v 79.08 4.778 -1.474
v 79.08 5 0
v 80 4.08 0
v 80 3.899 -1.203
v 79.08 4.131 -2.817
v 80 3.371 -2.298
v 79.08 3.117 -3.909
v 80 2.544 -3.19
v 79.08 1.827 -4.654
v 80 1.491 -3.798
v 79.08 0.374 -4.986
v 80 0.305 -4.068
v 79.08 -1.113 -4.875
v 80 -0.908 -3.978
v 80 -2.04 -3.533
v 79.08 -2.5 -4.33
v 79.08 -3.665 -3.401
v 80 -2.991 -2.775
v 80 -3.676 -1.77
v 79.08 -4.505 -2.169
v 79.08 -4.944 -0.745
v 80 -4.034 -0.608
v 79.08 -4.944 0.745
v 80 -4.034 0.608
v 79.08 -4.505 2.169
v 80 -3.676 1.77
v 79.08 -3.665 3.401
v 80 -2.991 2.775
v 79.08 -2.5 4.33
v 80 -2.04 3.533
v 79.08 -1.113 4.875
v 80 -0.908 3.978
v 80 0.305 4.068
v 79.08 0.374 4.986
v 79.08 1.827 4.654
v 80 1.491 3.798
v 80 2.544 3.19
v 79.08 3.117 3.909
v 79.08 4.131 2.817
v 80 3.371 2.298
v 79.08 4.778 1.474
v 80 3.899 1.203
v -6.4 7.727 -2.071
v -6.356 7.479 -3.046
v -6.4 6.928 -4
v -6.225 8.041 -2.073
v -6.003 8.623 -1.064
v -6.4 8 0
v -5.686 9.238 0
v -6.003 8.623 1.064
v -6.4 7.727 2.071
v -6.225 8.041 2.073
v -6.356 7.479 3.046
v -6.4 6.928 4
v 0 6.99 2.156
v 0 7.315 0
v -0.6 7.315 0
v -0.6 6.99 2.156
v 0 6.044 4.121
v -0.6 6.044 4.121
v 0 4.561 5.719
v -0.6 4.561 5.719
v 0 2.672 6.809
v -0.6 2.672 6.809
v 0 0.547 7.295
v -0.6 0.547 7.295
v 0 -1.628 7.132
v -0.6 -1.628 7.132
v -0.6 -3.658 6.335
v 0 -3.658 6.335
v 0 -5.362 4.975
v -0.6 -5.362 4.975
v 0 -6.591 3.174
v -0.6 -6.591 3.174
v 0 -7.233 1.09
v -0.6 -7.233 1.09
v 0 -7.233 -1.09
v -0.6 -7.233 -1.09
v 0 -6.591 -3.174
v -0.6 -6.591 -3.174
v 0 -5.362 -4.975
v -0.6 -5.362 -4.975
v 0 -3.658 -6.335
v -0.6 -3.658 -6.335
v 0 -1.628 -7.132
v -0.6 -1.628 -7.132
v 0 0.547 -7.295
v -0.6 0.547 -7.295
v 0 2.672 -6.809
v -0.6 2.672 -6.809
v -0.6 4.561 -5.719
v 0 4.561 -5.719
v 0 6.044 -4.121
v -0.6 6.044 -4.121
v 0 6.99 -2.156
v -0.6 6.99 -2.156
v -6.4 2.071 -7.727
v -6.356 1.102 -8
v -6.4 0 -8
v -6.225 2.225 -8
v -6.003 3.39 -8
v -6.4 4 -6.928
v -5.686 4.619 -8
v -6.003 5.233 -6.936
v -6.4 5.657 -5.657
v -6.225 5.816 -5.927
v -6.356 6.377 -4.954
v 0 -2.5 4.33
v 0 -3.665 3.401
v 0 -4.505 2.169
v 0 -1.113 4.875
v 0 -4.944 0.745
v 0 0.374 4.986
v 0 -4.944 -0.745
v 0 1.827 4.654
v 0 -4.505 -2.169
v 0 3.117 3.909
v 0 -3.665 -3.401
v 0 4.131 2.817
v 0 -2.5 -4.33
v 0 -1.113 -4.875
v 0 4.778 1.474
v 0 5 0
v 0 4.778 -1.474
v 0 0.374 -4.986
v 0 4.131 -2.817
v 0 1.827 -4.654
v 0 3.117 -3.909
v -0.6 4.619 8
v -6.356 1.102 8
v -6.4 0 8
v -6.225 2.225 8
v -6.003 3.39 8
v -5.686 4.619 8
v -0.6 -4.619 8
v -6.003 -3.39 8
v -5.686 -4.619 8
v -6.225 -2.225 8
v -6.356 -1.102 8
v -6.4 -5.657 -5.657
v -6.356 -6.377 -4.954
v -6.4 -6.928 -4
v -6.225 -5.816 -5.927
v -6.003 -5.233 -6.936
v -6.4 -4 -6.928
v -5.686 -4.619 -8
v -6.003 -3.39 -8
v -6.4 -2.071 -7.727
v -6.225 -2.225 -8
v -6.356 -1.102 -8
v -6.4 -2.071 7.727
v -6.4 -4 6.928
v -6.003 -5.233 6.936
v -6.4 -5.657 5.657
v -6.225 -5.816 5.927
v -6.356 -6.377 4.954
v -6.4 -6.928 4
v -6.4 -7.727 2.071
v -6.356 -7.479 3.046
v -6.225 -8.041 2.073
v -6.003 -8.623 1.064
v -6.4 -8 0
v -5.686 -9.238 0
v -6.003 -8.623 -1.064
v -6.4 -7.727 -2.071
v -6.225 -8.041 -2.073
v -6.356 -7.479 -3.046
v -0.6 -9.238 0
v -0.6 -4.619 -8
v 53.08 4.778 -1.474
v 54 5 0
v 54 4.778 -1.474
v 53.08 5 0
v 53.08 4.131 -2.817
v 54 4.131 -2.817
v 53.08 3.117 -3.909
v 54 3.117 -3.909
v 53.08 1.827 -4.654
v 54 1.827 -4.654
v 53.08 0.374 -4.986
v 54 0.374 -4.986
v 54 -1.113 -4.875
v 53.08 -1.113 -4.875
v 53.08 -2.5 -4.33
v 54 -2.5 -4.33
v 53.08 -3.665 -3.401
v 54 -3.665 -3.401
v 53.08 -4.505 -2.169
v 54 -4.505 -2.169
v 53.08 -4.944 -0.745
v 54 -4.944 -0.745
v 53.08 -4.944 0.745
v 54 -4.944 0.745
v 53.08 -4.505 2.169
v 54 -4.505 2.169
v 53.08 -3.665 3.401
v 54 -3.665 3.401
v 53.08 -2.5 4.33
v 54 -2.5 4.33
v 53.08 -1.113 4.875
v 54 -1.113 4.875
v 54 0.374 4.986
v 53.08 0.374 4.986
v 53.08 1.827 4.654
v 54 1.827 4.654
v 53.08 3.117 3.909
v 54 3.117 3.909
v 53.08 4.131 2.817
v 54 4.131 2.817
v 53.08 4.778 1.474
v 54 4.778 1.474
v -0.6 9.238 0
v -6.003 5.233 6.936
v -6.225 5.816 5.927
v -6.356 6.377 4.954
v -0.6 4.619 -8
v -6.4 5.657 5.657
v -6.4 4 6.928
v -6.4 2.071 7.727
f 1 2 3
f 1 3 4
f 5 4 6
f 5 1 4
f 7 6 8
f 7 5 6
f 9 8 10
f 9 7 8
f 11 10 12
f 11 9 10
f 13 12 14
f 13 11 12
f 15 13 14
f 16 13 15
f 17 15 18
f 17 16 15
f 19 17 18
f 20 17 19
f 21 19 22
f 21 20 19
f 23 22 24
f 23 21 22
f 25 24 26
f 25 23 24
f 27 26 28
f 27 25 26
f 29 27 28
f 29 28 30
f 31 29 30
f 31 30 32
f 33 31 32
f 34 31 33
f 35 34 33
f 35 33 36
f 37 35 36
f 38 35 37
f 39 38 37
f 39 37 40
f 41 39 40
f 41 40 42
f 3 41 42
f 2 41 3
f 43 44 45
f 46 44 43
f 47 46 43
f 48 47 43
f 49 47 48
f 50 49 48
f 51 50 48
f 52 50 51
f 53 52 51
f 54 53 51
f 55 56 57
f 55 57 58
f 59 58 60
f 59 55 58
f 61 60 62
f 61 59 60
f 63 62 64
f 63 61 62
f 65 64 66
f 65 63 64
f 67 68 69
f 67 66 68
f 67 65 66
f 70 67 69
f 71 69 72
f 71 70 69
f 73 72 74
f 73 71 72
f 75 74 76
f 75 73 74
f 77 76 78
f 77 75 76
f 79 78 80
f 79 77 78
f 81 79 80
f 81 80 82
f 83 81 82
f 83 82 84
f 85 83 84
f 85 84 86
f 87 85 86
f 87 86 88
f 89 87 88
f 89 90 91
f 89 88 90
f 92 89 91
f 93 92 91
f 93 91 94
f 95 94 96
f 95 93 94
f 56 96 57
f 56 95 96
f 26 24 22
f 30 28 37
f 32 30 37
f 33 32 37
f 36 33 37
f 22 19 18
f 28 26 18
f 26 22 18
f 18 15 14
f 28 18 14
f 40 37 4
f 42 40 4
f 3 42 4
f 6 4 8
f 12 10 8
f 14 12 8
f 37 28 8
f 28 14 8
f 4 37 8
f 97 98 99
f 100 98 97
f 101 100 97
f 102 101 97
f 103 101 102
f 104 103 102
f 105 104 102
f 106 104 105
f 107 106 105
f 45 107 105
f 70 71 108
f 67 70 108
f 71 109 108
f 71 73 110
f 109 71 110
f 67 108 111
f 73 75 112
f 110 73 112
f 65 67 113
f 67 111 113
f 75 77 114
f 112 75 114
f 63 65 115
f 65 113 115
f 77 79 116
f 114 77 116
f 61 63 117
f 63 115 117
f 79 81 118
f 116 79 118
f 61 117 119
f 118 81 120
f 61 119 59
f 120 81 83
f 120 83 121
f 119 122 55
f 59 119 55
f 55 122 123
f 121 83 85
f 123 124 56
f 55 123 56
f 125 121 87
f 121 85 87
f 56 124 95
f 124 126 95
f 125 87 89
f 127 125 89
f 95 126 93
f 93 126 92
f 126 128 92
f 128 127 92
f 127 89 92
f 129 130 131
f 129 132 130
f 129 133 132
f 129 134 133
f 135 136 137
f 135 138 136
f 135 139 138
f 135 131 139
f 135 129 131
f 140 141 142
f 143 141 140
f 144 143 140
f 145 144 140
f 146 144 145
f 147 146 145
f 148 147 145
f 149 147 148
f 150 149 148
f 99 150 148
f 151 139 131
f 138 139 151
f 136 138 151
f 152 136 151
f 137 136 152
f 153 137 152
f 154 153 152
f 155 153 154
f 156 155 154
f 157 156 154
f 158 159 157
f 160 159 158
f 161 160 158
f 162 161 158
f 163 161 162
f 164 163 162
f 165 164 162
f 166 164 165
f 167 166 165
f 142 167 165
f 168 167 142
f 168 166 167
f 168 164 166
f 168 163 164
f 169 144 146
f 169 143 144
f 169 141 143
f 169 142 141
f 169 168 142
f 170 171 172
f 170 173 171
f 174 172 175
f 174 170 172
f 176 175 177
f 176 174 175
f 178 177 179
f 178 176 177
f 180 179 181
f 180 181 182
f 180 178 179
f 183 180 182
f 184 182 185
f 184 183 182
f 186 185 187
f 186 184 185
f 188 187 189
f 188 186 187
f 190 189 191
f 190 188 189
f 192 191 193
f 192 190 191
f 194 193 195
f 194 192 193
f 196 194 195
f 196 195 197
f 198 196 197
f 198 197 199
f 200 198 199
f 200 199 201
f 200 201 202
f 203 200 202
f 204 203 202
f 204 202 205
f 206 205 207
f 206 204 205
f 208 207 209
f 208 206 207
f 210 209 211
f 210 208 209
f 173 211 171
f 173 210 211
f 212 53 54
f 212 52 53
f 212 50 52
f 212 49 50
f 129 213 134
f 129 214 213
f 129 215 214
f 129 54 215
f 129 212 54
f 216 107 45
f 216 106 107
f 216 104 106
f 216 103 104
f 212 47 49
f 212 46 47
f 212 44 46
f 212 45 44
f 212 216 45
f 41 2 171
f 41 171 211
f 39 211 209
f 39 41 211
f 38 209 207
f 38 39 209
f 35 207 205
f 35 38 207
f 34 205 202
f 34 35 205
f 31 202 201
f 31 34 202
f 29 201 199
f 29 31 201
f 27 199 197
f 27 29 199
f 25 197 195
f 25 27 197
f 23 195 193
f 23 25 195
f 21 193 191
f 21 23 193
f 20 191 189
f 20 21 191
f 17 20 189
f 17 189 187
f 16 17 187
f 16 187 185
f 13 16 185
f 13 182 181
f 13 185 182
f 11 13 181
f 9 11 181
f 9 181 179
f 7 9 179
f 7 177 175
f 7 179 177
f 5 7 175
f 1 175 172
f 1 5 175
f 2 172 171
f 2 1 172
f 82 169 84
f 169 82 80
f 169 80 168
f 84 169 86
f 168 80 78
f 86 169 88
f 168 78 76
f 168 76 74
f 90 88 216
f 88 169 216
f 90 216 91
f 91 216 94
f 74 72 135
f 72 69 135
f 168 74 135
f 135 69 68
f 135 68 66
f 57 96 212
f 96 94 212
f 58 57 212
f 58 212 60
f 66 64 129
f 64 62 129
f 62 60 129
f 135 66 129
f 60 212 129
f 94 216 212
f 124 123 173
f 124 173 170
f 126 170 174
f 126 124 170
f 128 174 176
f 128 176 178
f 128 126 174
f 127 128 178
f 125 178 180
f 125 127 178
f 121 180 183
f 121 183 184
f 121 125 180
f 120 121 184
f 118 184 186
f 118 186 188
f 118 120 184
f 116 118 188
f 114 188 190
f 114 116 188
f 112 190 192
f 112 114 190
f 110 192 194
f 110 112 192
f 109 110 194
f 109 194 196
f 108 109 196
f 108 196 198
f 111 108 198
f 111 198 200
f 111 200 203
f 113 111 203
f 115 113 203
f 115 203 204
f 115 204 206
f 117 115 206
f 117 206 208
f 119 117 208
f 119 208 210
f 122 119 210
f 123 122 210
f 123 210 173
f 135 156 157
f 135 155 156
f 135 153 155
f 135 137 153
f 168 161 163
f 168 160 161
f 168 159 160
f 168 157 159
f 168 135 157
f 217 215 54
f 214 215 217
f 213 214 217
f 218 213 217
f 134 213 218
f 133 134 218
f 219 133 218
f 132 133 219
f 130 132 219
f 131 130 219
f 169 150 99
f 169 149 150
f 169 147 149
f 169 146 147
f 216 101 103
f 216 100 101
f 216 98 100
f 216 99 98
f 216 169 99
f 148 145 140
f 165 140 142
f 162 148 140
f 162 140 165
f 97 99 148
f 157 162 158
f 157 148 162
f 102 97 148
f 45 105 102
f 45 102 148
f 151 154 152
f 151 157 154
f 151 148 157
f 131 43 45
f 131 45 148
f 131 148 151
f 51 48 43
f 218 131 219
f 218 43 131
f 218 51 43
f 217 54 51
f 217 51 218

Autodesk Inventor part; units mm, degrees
ref_plane "YZ Plane" through (0, 0, 0) normal (1, 0, 0) x (0, 1, 0)
ref_plane "XZ Plane" through (0, 0, 0) normal (0, 1, 0) x (-1, 0, 0)
sketch "Sketch1" plane through (0, 0, 0) normal (0, 0, 1) x (1, 0, 0)
  line L0 (0, 7.315) -> (0, 5)
  line L1 (54, 5) -> (80, 5)
  line L2 (80, 5) -> (80, 0)
  line L3 (80, 0) -> (-0.6001, 0)
  line L4 (-16.7201, 0) -> (96.12, 0) projected
  line L5 (-0.6001, 0) -> (-0.6001, 7.315)
  line L6 (-0.6001, 7.315) -> (0, 7.315)
  line L7 (54, 5) -> (53.0797, 5)
  line L8 (53.0797, 5) -> (0, 5)
  line L9 (0, -1.463) -> (0, 8.778) projected
  dimension "d0" = 80
  dimension "d1" = 26
  dimension "d2" = 10
  dimension "d9" = 0.6001
  dimension "d10" = 14.63
  dimension "d13" = 0.9203
  dimension "d14" = 10
revolve "Body" add sketch "Sketch1" angle 360 about axis through (80, 0, 0) along (-1, 0, 0)
sketch "Sketch2" plane through (-0.6001, 0, 0) normal (-1, 0, 0) x (0, 0, 1)
  line L0 (0, 9.2376) -> (8, 4.6188)
  line L1 (8, 4.6188) -> (8, -4.6188)
  line L2 (8, -4.6188) -> (0, -9.2376)
  line L3 (0, -9.2376) -> (-8, -4.6188)
  line L4 (-8, -4.6188) -> (-8, 4.6188)
  line L5 (-8, 4.6188) -> (0, 9.2376)
  point P0 (0, 0)
  point P1 (0, 0)
  dimension "d11" = 16
extrude "Head" add sketch "Sketch2" along normal blind 5.8
sketch "Sketch4" plane through (0, 0, 0) normal (0, 0, 1) x (1, 0, 0)
  line L0 (-6.4001, 8) -> (-6.4001, 9.2376)
  line L1 (-6.4001, 9.2376) -> (-5.6856, 9.2376)
  line L2 (-5.6856, 9.2376) -> (-6.4001, 8)
  line L3 (-7.5601, 0) -> (0.5599, 0) projected
  line L4 (-0.6001, 9.2376) -> (-6.4001, 9.2376) projected
  line L5 (-6.4001, 4.6188) -> (-6.4001, 9.2376) projected
  dimension "d5" = 30
  dimension "d19" = 16
revolve "Chamfer1" cut sketch "Sketch4" angle 360 about axis through (-10, 0, 0) along (1, 0, 0)
thread "Thread" size "M10x1.5" class "6g" standard "ISO Metric profile" length 26
chamfer "Chamfer2" distance 0.9202 distance2 0.9203 1 edges at (80, -5, 0) measured on face at (80, 0.2493, 1.2557)
ref_plane "Work Plane1" through (1.525, 0, 0) normal (0, 0, 1) x (1, 0, 0)
equation "\"d0\" = NLG"
equation "\"d1\" = GEL"
equation "\"d2\" = GD"
equation "\"d10\" = SD2"
equation "\"d14\" = BDM"
equation "\"d11\" = SW"
equation "\"d3\" = KOH - SD"
equation "\"d5\" = ANG1"
equation "\"d19\" = SW0"
equation "\"d15\" = GEL"
equation "\"d6\" = -0.5 * SPD + 0.5 * GD"
equation "\"NLG\" = 80"
equation "\"GD\" = NND"
equation "\"BDM\" = NND"
equation "\"KOH\" = 6.4"
equation "\"GEL\" = 26"
equation "\"SW\" = 16"
equation "\"SW0\" = SW"
equation "\"SPD\" = NND - 1.2269 * PTC"
equation "\"SD2\" = 14.63"
equation "\"SD\" = 0.6"
equation "\"ANG1\" = 30deg"
equation "\"GAL\" = 0.61345 * PTC"
equation "\"GUL\" = 0.61345 * PTC"
equation "\"RR\" = 0.4"
equation "\"GD1\" = THREADDIA - 1.2269 * PTC"
equation "\"SDH\" = SD2"
equation "\"TOA\" = 30deg"
equation "\"PTC\" = 1.5"
equation "\"E0\" = 1.155 * SW"
equation "\"NND\" = 10"
equation "\"THREADDIA\" = 10"
properties part number "ISO 4014 - M10 x 80" material "Stainless Steel, 440C"
